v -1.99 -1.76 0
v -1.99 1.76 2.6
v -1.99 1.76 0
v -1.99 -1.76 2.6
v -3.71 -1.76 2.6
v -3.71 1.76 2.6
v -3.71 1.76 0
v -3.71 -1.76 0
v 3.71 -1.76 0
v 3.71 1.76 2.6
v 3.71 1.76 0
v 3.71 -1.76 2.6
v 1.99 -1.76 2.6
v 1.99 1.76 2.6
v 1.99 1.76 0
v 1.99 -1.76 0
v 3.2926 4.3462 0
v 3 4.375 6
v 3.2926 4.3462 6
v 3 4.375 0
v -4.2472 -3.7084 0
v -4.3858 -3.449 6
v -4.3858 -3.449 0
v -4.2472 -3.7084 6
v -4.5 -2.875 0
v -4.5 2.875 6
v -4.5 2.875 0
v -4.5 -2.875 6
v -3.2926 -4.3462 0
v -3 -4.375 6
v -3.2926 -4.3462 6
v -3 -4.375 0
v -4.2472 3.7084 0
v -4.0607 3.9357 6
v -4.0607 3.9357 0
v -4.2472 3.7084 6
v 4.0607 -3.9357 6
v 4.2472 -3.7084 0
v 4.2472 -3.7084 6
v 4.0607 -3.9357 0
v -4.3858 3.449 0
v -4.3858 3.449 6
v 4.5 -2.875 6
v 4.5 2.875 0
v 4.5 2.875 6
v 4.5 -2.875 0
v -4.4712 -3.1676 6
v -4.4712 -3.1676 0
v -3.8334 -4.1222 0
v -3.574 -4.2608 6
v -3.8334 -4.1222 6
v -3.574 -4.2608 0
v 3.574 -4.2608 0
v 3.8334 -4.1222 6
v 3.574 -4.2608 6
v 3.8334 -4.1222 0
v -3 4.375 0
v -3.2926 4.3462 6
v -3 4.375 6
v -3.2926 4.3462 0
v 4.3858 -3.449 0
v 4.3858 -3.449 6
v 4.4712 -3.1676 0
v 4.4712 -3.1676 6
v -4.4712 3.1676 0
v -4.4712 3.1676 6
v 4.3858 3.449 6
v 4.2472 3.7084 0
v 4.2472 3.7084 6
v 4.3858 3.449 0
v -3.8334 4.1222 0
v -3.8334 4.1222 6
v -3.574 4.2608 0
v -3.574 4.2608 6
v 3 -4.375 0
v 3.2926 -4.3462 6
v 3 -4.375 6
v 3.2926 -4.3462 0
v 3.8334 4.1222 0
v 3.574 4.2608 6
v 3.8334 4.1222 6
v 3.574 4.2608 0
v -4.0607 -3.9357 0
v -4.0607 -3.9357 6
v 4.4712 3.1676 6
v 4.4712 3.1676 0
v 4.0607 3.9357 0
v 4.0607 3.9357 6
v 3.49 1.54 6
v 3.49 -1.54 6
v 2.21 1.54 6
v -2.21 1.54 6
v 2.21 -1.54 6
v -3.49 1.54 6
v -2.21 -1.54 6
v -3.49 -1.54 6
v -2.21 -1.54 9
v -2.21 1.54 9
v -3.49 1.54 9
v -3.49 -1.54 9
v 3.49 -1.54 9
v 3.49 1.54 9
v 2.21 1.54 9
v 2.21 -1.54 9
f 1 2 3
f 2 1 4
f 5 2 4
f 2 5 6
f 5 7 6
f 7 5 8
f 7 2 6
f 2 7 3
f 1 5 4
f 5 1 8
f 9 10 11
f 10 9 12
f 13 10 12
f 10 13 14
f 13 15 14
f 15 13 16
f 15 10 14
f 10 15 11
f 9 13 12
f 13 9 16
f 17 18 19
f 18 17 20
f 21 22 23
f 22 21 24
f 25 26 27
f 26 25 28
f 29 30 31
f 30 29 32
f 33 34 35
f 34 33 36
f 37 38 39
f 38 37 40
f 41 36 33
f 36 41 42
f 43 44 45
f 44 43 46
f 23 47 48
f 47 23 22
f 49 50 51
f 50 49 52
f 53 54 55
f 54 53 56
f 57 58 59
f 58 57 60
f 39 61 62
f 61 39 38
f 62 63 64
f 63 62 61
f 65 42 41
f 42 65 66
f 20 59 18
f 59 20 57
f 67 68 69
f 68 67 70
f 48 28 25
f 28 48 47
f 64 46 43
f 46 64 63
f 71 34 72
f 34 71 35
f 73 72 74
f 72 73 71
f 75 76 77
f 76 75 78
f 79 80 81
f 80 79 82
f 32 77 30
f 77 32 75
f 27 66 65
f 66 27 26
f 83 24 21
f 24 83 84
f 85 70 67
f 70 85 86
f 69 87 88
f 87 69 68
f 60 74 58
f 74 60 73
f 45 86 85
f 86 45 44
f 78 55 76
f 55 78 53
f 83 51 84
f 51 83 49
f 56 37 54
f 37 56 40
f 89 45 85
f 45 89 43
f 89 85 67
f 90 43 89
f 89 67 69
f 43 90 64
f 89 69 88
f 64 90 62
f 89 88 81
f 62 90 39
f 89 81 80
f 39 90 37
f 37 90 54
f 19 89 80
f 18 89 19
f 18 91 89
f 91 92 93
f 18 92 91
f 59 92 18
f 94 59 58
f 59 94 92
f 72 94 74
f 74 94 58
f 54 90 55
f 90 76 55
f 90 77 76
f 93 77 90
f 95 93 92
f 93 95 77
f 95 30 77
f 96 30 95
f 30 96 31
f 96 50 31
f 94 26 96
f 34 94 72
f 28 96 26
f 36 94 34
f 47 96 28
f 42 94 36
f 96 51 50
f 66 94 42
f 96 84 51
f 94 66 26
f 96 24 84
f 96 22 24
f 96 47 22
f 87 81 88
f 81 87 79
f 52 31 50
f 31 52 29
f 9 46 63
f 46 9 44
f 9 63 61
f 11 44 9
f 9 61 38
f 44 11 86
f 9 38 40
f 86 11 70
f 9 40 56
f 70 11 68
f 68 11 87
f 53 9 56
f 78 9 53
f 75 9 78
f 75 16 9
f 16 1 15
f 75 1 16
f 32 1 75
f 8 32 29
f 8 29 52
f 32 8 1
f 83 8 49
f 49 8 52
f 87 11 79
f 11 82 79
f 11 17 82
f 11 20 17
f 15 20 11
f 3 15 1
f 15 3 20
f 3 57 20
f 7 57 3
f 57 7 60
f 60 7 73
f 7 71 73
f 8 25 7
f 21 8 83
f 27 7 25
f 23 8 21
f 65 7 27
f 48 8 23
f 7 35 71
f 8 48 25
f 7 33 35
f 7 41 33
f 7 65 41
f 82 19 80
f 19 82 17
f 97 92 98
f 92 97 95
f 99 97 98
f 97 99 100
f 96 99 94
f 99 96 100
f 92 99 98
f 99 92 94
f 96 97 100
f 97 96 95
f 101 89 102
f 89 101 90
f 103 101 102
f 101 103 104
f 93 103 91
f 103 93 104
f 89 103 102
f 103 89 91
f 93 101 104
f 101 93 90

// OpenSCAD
// Choc v1 keycap reposition adapter (riser / tilter / offsetter)
// Snaps onto a Kailh Choc v1 (PG1350) switch stem and presents a new
// pair of choc legs on top, raised, tilted, rotated and/or offset.
//
// Stem dimensions below are nominal: measure your switches and keycaps
// with calipers and tweak the Fit values after a test print.

/* [Choc v1 stem (nominal, measure yours)] */
stem_w     = 1.2;   // X width of each leg
stem_d     = 3.0;   // Y depth of each leg
stem_pitch = 5.7;   // X center-to-center spacing of the two legs
peg_h      = 3.0;   // height of the new legs on top

/* [Fit] */
// added per side to the bottom sockets (bigger = looser)
socket_clear = 0.26; // [0:0.01:0.5]
// removed per side from the top pegs (bigger = looser, negative = fatter pegs)
peg_shrink   = -0.04; // [-0.15:0.01:0.2]
socket_depth = 2.6;  // how far the switch stem goes into the adapter

/* [Reposition] */
// extra height (mm) between base block and top slab
riser    = 2.0;  // [0:0.1:10]
// tilt forward/back in degrees (+ tilts the keycap toward -Y)
tilt_x   = 0;    // [-45:1:45]
// tilt left/right in degrees (+ tilts the keycap toward +X)
tilt_y   = 0;    // [-45:1:45]
// spin the keycap about vertical, in degrees
rotate_z = 0;    // [-180:1:180]
// shift keycap left/right (mm)
offset_x = 0;    // [-5:0.1:5]
// shift keycap forward/back (mm)
offset_y = 0;    // [-5:0.1:5]

/* [Body] */
body_w     = 9;    // X size of base block and top slab
body_d     = 8.75; // Y size of base block and top slab
// radius of the four outer vertical corners (mm)
corner_r   = 1.5;  // [0:0.1:4]
roof       = 0.6;  // material above the sockets in the base block
slab_t     = 0.8;  // thickness of the top slab under the new pegs

/* [Batch] */
// how many adapters to generate
count   = 1;   // [1:1:50]
// adapters per row
columns = 5;   // [1:1:20]
// space between neighboring adapters (mm); raise this for big tilts/offsets
gap     = 3;   // [0.5:0.5:20]

/* [Runner] */
// connect all pieces with a thin strip
runner   = false;
// width of the runner strip (mm)
runner_w = 1.0;  // [0.4:0.1:3]
// height of the runner strip (mm), printed flat on the bed
runner_h = 0.6;  // [0.2:0.1:2]
// how far the runner reaches into each piece (mm)
runner_overlap = 0.5; // [0.1:0.1:2]

/* [Hidden] */
$fn = 32;
eps = 0.01;
base_h = socket_depth + roof;
// keep the radius from exceeding half the smaller side
r_eff = max(0, min(corner_r, min(body_w, body_d) / 2 - eps));
pitch_x = body_w + gap;
pitch_y = body_d + gap;
cols = min(columns, count);
rows = ceil(count / cols);

// Rounded-corner box, centered in XY, sitting on z=0
module rounded_box(w, d, h) {
    linear_extrude(height = h)
        offset(r = r_eff)
            square([w - 2 * r_eff, d - 2 * r_eff], center = true);
}

// Two choc legs, centered on origin in XY, sitting on z=0
module legs(w, d, h) {
    for (s = [-1, 1])
        translate([s * stem_pitch / 2, 0, h / 2])
            cube([w, d, h], center = true);
}

// Transform for everything on top of the riser
module place_top() {
    translate([offset_x, offset_y, base_h + riser])
        rotate([tilt_x, tilt_y, 0])
            rotate([0, 0, rotate_z])
                children();
}

module base_block() {
    rounded_box(body_w, body_d, base_h);
}

module top_slab() {
    place_top()
        rounded_box(body_w, body_d, slab_t);
}

module adapter() {
    difference() {
        hull() {
            base_block();
            top_slab();
        }
        // sockets for the switch stem
        translate([0, 0, -eps])
            legs(stem_w + 2 * socket_clear,
                 stem_d + 2 * socket_clear,
                 socket_depth + eps);
    }
    // new legs for the keycap
    place_top()
        translate([0, 0, slab_t - eps])
            legs(stem_w - 2 * peg_shrink,
                 stem_d - 2 * peg_shrink,
                 peg_h + eps);
}

// XY position of adapter i in the grid
function pos(i) = [(i % cols) * pitch_x, -floor(i / cols) * pitch_y, 0];

// Runner segments only span the gaps between pieces, so they never
// cover the stem sockets on the underside.
module runners() {
    // along each row, between horizontal neighbors
    len_x = gap + 2 * runner_overlap;
    for (i = [0 : count - 1])
        if ((i % cols) < cols - 1 && i + 1 < count)
            translate(pos(i) + [body_w / 2 + gap / 2, 0, runner_h / 2])
                cube([len_x, runner_w, runner_h], center = true);

    // spine down the first column, joining the rows
    len_y = gap + 2 * runner_overlap;
    for (r = [0 : rows - 2])
        translate(pos(r * cols) + [0, -(body_d / 2 + gap / 2), runner_h / 2])
            cube([runner_w, len_y, runner_h], center = true);
}

for (i = [0 : count - 1])
    translate(pos(i)) adapter();

if (runner && count > 1)
    runners();
